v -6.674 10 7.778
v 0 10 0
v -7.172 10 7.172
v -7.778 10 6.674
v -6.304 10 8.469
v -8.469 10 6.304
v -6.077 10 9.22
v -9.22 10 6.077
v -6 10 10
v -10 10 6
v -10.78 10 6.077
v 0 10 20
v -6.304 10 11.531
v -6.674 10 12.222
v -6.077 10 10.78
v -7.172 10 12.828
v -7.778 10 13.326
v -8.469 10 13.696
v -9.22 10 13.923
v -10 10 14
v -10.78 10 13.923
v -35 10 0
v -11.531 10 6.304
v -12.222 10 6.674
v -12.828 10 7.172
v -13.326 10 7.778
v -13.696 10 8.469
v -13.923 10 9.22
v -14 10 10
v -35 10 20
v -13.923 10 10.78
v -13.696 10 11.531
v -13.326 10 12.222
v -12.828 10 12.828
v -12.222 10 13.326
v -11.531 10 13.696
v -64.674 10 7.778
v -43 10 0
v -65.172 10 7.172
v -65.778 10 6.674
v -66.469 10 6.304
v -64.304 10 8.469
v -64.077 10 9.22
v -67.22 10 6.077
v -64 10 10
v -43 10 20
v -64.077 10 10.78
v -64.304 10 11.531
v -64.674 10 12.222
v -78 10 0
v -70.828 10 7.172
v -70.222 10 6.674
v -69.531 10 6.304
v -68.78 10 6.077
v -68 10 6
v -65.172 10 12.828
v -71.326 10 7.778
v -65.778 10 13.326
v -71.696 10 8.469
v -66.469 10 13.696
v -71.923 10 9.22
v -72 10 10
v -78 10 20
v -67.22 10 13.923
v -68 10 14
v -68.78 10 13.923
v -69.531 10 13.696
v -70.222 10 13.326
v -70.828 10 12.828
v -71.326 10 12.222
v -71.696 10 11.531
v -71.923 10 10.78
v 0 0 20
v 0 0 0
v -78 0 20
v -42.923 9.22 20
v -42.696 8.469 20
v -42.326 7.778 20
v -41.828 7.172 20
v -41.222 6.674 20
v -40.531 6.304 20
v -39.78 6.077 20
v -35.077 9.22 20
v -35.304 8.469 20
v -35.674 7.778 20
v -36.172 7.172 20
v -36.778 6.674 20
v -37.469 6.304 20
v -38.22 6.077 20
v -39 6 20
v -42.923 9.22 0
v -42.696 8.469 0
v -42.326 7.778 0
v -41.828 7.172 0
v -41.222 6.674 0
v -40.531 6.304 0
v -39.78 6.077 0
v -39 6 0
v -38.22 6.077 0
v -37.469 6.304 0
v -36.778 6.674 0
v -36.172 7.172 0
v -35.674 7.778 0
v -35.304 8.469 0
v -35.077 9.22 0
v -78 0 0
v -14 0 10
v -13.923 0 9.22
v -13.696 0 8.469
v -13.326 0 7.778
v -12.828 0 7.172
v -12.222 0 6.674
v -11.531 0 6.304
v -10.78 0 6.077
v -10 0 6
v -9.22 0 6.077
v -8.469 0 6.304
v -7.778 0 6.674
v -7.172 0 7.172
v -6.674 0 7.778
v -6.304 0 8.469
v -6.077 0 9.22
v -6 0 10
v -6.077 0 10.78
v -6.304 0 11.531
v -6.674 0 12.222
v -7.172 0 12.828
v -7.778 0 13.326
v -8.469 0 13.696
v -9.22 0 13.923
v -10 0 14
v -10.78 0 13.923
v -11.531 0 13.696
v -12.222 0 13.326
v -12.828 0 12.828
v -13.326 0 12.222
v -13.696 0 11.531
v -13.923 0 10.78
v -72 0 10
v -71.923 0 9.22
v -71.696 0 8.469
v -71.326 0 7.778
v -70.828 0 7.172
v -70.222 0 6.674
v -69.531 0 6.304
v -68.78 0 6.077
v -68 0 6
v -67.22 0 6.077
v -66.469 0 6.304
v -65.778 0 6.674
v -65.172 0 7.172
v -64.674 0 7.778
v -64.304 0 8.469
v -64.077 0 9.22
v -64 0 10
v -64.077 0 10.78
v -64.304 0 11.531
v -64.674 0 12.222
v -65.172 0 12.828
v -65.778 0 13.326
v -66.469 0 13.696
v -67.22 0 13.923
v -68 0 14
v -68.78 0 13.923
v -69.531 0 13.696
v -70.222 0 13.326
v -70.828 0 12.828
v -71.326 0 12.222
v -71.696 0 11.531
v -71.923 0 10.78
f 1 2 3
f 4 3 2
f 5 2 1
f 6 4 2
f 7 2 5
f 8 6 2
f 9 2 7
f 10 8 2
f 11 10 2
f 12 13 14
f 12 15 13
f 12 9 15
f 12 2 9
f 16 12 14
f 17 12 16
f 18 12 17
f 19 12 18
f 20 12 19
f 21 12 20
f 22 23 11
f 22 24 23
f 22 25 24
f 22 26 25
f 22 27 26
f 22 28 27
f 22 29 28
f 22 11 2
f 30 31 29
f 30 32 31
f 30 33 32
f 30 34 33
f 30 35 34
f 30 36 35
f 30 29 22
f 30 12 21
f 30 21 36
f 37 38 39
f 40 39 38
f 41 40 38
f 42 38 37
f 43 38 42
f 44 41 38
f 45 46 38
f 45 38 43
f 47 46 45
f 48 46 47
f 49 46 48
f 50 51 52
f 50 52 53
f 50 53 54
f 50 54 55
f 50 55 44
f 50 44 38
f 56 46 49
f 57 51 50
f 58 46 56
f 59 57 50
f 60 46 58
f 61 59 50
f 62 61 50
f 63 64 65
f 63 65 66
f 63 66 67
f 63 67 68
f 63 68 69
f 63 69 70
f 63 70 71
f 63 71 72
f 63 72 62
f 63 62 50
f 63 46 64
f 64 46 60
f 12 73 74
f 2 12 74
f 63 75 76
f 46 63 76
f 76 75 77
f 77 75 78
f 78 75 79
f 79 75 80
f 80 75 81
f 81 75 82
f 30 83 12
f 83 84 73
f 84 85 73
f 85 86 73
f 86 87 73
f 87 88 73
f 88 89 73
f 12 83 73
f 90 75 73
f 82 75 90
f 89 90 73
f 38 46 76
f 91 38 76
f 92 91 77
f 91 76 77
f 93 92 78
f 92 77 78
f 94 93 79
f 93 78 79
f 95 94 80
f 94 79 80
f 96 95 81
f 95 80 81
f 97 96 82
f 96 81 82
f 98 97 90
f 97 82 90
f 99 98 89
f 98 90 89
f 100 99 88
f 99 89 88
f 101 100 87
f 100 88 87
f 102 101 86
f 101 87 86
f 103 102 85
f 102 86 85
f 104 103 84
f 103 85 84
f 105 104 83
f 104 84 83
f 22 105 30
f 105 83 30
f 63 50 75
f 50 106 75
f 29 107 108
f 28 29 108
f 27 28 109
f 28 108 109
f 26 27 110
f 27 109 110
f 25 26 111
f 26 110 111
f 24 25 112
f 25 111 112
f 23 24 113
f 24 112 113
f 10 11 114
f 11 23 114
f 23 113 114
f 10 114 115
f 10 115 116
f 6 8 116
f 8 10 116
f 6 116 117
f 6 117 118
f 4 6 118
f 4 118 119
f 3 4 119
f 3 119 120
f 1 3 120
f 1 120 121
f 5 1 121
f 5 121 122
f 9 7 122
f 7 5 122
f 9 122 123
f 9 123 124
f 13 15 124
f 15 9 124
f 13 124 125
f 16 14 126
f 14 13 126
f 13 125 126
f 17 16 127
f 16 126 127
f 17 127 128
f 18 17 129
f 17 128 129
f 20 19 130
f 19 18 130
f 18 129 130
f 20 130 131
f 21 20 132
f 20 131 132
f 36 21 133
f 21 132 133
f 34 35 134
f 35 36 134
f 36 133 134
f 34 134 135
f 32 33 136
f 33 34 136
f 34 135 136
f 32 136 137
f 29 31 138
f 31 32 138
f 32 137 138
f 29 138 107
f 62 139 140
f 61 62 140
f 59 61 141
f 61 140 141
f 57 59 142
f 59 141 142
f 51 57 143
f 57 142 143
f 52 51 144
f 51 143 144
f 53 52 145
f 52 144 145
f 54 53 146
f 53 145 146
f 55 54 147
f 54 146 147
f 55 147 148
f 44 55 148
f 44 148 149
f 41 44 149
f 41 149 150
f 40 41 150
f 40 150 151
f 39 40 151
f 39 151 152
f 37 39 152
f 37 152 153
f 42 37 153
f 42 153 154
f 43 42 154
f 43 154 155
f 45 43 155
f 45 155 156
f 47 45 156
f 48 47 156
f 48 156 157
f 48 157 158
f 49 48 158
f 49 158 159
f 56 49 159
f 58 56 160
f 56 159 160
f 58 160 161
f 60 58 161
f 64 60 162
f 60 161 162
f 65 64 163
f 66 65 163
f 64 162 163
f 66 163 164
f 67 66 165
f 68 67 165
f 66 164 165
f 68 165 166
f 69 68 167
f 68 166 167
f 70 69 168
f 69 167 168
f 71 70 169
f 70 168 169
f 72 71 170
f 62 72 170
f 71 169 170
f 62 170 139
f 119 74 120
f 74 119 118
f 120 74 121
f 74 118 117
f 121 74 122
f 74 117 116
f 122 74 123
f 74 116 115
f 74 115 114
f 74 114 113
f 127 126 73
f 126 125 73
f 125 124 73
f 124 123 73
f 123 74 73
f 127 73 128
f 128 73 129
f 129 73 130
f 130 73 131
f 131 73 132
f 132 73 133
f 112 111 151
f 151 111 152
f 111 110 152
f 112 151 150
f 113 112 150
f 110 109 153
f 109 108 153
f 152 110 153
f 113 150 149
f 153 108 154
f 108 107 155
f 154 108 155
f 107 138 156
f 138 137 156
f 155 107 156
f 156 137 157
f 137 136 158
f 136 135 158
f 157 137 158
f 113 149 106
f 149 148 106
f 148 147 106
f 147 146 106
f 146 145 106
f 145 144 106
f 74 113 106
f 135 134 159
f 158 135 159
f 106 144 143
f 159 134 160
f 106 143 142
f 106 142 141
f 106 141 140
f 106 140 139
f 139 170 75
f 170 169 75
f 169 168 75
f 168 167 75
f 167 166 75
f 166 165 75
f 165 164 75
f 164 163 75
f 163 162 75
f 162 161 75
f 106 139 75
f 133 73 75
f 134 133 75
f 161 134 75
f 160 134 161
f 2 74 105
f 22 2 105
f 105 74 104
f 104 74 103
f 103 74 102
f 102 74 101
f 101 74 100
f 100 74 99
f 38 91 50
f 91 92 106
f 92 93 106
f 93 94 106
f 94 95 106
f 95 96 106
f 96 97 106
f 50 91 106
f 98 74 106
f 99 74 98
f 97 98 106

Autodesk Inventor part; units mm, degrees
ref_plane "YZ Plane" through (0, 0, 0) normal (1, 0, 0) x (0, 1, 0)
ref_plane "XZ Plane" through (0, 0, 0) normal (0, 1, 0) x (-1, 0, 0)
ref_plane "XY Plane" through (0, 0, 0) normal (0, 0, 1) x (1, 0, 0)
sketch "Sketch1" plane through (0, 0, 0) normal (0, 1, 0) x (-1, 0, 0)
  line L0 (0, 0) -> (78, 0)
  line L1 (78, 0) -> (78, 20)
  line L2 (78, 20) -> (0, 20)
  line L3 (0, 20) -> (0, 0)
  line L4 (39, 10) -> (68, 10)
  line L5 (39, 10) -> (10, 10)
  circle A0 centre (10, 10) radius 4
  circle A1 centre (68, 10) radius 4
  dimension "d0" = 78
  dimension "d1" = 20
  dimension "d2" = 29
  dimension "d3" = 29
  dimension "d4" = 8
  dimension "d5" = 8
extrude "Extrusion1" add sketch "Sketch1" along normal blind 10
sketch "Sketch2" plane through (-78, 0, 20) normal (0, 0, 1) x (1, 0, 0)
  line L0 (0, 10) -> (78, 10) projected
  circle A0 centre (39, 10) radius 4
  dimension "d8" = 8
extrude "Extrusion2" cut sketch "Sketch2" against normal blind 20
properties part number "Z_MotorMount_RodHolder_Part2_V2" material "Birch"
